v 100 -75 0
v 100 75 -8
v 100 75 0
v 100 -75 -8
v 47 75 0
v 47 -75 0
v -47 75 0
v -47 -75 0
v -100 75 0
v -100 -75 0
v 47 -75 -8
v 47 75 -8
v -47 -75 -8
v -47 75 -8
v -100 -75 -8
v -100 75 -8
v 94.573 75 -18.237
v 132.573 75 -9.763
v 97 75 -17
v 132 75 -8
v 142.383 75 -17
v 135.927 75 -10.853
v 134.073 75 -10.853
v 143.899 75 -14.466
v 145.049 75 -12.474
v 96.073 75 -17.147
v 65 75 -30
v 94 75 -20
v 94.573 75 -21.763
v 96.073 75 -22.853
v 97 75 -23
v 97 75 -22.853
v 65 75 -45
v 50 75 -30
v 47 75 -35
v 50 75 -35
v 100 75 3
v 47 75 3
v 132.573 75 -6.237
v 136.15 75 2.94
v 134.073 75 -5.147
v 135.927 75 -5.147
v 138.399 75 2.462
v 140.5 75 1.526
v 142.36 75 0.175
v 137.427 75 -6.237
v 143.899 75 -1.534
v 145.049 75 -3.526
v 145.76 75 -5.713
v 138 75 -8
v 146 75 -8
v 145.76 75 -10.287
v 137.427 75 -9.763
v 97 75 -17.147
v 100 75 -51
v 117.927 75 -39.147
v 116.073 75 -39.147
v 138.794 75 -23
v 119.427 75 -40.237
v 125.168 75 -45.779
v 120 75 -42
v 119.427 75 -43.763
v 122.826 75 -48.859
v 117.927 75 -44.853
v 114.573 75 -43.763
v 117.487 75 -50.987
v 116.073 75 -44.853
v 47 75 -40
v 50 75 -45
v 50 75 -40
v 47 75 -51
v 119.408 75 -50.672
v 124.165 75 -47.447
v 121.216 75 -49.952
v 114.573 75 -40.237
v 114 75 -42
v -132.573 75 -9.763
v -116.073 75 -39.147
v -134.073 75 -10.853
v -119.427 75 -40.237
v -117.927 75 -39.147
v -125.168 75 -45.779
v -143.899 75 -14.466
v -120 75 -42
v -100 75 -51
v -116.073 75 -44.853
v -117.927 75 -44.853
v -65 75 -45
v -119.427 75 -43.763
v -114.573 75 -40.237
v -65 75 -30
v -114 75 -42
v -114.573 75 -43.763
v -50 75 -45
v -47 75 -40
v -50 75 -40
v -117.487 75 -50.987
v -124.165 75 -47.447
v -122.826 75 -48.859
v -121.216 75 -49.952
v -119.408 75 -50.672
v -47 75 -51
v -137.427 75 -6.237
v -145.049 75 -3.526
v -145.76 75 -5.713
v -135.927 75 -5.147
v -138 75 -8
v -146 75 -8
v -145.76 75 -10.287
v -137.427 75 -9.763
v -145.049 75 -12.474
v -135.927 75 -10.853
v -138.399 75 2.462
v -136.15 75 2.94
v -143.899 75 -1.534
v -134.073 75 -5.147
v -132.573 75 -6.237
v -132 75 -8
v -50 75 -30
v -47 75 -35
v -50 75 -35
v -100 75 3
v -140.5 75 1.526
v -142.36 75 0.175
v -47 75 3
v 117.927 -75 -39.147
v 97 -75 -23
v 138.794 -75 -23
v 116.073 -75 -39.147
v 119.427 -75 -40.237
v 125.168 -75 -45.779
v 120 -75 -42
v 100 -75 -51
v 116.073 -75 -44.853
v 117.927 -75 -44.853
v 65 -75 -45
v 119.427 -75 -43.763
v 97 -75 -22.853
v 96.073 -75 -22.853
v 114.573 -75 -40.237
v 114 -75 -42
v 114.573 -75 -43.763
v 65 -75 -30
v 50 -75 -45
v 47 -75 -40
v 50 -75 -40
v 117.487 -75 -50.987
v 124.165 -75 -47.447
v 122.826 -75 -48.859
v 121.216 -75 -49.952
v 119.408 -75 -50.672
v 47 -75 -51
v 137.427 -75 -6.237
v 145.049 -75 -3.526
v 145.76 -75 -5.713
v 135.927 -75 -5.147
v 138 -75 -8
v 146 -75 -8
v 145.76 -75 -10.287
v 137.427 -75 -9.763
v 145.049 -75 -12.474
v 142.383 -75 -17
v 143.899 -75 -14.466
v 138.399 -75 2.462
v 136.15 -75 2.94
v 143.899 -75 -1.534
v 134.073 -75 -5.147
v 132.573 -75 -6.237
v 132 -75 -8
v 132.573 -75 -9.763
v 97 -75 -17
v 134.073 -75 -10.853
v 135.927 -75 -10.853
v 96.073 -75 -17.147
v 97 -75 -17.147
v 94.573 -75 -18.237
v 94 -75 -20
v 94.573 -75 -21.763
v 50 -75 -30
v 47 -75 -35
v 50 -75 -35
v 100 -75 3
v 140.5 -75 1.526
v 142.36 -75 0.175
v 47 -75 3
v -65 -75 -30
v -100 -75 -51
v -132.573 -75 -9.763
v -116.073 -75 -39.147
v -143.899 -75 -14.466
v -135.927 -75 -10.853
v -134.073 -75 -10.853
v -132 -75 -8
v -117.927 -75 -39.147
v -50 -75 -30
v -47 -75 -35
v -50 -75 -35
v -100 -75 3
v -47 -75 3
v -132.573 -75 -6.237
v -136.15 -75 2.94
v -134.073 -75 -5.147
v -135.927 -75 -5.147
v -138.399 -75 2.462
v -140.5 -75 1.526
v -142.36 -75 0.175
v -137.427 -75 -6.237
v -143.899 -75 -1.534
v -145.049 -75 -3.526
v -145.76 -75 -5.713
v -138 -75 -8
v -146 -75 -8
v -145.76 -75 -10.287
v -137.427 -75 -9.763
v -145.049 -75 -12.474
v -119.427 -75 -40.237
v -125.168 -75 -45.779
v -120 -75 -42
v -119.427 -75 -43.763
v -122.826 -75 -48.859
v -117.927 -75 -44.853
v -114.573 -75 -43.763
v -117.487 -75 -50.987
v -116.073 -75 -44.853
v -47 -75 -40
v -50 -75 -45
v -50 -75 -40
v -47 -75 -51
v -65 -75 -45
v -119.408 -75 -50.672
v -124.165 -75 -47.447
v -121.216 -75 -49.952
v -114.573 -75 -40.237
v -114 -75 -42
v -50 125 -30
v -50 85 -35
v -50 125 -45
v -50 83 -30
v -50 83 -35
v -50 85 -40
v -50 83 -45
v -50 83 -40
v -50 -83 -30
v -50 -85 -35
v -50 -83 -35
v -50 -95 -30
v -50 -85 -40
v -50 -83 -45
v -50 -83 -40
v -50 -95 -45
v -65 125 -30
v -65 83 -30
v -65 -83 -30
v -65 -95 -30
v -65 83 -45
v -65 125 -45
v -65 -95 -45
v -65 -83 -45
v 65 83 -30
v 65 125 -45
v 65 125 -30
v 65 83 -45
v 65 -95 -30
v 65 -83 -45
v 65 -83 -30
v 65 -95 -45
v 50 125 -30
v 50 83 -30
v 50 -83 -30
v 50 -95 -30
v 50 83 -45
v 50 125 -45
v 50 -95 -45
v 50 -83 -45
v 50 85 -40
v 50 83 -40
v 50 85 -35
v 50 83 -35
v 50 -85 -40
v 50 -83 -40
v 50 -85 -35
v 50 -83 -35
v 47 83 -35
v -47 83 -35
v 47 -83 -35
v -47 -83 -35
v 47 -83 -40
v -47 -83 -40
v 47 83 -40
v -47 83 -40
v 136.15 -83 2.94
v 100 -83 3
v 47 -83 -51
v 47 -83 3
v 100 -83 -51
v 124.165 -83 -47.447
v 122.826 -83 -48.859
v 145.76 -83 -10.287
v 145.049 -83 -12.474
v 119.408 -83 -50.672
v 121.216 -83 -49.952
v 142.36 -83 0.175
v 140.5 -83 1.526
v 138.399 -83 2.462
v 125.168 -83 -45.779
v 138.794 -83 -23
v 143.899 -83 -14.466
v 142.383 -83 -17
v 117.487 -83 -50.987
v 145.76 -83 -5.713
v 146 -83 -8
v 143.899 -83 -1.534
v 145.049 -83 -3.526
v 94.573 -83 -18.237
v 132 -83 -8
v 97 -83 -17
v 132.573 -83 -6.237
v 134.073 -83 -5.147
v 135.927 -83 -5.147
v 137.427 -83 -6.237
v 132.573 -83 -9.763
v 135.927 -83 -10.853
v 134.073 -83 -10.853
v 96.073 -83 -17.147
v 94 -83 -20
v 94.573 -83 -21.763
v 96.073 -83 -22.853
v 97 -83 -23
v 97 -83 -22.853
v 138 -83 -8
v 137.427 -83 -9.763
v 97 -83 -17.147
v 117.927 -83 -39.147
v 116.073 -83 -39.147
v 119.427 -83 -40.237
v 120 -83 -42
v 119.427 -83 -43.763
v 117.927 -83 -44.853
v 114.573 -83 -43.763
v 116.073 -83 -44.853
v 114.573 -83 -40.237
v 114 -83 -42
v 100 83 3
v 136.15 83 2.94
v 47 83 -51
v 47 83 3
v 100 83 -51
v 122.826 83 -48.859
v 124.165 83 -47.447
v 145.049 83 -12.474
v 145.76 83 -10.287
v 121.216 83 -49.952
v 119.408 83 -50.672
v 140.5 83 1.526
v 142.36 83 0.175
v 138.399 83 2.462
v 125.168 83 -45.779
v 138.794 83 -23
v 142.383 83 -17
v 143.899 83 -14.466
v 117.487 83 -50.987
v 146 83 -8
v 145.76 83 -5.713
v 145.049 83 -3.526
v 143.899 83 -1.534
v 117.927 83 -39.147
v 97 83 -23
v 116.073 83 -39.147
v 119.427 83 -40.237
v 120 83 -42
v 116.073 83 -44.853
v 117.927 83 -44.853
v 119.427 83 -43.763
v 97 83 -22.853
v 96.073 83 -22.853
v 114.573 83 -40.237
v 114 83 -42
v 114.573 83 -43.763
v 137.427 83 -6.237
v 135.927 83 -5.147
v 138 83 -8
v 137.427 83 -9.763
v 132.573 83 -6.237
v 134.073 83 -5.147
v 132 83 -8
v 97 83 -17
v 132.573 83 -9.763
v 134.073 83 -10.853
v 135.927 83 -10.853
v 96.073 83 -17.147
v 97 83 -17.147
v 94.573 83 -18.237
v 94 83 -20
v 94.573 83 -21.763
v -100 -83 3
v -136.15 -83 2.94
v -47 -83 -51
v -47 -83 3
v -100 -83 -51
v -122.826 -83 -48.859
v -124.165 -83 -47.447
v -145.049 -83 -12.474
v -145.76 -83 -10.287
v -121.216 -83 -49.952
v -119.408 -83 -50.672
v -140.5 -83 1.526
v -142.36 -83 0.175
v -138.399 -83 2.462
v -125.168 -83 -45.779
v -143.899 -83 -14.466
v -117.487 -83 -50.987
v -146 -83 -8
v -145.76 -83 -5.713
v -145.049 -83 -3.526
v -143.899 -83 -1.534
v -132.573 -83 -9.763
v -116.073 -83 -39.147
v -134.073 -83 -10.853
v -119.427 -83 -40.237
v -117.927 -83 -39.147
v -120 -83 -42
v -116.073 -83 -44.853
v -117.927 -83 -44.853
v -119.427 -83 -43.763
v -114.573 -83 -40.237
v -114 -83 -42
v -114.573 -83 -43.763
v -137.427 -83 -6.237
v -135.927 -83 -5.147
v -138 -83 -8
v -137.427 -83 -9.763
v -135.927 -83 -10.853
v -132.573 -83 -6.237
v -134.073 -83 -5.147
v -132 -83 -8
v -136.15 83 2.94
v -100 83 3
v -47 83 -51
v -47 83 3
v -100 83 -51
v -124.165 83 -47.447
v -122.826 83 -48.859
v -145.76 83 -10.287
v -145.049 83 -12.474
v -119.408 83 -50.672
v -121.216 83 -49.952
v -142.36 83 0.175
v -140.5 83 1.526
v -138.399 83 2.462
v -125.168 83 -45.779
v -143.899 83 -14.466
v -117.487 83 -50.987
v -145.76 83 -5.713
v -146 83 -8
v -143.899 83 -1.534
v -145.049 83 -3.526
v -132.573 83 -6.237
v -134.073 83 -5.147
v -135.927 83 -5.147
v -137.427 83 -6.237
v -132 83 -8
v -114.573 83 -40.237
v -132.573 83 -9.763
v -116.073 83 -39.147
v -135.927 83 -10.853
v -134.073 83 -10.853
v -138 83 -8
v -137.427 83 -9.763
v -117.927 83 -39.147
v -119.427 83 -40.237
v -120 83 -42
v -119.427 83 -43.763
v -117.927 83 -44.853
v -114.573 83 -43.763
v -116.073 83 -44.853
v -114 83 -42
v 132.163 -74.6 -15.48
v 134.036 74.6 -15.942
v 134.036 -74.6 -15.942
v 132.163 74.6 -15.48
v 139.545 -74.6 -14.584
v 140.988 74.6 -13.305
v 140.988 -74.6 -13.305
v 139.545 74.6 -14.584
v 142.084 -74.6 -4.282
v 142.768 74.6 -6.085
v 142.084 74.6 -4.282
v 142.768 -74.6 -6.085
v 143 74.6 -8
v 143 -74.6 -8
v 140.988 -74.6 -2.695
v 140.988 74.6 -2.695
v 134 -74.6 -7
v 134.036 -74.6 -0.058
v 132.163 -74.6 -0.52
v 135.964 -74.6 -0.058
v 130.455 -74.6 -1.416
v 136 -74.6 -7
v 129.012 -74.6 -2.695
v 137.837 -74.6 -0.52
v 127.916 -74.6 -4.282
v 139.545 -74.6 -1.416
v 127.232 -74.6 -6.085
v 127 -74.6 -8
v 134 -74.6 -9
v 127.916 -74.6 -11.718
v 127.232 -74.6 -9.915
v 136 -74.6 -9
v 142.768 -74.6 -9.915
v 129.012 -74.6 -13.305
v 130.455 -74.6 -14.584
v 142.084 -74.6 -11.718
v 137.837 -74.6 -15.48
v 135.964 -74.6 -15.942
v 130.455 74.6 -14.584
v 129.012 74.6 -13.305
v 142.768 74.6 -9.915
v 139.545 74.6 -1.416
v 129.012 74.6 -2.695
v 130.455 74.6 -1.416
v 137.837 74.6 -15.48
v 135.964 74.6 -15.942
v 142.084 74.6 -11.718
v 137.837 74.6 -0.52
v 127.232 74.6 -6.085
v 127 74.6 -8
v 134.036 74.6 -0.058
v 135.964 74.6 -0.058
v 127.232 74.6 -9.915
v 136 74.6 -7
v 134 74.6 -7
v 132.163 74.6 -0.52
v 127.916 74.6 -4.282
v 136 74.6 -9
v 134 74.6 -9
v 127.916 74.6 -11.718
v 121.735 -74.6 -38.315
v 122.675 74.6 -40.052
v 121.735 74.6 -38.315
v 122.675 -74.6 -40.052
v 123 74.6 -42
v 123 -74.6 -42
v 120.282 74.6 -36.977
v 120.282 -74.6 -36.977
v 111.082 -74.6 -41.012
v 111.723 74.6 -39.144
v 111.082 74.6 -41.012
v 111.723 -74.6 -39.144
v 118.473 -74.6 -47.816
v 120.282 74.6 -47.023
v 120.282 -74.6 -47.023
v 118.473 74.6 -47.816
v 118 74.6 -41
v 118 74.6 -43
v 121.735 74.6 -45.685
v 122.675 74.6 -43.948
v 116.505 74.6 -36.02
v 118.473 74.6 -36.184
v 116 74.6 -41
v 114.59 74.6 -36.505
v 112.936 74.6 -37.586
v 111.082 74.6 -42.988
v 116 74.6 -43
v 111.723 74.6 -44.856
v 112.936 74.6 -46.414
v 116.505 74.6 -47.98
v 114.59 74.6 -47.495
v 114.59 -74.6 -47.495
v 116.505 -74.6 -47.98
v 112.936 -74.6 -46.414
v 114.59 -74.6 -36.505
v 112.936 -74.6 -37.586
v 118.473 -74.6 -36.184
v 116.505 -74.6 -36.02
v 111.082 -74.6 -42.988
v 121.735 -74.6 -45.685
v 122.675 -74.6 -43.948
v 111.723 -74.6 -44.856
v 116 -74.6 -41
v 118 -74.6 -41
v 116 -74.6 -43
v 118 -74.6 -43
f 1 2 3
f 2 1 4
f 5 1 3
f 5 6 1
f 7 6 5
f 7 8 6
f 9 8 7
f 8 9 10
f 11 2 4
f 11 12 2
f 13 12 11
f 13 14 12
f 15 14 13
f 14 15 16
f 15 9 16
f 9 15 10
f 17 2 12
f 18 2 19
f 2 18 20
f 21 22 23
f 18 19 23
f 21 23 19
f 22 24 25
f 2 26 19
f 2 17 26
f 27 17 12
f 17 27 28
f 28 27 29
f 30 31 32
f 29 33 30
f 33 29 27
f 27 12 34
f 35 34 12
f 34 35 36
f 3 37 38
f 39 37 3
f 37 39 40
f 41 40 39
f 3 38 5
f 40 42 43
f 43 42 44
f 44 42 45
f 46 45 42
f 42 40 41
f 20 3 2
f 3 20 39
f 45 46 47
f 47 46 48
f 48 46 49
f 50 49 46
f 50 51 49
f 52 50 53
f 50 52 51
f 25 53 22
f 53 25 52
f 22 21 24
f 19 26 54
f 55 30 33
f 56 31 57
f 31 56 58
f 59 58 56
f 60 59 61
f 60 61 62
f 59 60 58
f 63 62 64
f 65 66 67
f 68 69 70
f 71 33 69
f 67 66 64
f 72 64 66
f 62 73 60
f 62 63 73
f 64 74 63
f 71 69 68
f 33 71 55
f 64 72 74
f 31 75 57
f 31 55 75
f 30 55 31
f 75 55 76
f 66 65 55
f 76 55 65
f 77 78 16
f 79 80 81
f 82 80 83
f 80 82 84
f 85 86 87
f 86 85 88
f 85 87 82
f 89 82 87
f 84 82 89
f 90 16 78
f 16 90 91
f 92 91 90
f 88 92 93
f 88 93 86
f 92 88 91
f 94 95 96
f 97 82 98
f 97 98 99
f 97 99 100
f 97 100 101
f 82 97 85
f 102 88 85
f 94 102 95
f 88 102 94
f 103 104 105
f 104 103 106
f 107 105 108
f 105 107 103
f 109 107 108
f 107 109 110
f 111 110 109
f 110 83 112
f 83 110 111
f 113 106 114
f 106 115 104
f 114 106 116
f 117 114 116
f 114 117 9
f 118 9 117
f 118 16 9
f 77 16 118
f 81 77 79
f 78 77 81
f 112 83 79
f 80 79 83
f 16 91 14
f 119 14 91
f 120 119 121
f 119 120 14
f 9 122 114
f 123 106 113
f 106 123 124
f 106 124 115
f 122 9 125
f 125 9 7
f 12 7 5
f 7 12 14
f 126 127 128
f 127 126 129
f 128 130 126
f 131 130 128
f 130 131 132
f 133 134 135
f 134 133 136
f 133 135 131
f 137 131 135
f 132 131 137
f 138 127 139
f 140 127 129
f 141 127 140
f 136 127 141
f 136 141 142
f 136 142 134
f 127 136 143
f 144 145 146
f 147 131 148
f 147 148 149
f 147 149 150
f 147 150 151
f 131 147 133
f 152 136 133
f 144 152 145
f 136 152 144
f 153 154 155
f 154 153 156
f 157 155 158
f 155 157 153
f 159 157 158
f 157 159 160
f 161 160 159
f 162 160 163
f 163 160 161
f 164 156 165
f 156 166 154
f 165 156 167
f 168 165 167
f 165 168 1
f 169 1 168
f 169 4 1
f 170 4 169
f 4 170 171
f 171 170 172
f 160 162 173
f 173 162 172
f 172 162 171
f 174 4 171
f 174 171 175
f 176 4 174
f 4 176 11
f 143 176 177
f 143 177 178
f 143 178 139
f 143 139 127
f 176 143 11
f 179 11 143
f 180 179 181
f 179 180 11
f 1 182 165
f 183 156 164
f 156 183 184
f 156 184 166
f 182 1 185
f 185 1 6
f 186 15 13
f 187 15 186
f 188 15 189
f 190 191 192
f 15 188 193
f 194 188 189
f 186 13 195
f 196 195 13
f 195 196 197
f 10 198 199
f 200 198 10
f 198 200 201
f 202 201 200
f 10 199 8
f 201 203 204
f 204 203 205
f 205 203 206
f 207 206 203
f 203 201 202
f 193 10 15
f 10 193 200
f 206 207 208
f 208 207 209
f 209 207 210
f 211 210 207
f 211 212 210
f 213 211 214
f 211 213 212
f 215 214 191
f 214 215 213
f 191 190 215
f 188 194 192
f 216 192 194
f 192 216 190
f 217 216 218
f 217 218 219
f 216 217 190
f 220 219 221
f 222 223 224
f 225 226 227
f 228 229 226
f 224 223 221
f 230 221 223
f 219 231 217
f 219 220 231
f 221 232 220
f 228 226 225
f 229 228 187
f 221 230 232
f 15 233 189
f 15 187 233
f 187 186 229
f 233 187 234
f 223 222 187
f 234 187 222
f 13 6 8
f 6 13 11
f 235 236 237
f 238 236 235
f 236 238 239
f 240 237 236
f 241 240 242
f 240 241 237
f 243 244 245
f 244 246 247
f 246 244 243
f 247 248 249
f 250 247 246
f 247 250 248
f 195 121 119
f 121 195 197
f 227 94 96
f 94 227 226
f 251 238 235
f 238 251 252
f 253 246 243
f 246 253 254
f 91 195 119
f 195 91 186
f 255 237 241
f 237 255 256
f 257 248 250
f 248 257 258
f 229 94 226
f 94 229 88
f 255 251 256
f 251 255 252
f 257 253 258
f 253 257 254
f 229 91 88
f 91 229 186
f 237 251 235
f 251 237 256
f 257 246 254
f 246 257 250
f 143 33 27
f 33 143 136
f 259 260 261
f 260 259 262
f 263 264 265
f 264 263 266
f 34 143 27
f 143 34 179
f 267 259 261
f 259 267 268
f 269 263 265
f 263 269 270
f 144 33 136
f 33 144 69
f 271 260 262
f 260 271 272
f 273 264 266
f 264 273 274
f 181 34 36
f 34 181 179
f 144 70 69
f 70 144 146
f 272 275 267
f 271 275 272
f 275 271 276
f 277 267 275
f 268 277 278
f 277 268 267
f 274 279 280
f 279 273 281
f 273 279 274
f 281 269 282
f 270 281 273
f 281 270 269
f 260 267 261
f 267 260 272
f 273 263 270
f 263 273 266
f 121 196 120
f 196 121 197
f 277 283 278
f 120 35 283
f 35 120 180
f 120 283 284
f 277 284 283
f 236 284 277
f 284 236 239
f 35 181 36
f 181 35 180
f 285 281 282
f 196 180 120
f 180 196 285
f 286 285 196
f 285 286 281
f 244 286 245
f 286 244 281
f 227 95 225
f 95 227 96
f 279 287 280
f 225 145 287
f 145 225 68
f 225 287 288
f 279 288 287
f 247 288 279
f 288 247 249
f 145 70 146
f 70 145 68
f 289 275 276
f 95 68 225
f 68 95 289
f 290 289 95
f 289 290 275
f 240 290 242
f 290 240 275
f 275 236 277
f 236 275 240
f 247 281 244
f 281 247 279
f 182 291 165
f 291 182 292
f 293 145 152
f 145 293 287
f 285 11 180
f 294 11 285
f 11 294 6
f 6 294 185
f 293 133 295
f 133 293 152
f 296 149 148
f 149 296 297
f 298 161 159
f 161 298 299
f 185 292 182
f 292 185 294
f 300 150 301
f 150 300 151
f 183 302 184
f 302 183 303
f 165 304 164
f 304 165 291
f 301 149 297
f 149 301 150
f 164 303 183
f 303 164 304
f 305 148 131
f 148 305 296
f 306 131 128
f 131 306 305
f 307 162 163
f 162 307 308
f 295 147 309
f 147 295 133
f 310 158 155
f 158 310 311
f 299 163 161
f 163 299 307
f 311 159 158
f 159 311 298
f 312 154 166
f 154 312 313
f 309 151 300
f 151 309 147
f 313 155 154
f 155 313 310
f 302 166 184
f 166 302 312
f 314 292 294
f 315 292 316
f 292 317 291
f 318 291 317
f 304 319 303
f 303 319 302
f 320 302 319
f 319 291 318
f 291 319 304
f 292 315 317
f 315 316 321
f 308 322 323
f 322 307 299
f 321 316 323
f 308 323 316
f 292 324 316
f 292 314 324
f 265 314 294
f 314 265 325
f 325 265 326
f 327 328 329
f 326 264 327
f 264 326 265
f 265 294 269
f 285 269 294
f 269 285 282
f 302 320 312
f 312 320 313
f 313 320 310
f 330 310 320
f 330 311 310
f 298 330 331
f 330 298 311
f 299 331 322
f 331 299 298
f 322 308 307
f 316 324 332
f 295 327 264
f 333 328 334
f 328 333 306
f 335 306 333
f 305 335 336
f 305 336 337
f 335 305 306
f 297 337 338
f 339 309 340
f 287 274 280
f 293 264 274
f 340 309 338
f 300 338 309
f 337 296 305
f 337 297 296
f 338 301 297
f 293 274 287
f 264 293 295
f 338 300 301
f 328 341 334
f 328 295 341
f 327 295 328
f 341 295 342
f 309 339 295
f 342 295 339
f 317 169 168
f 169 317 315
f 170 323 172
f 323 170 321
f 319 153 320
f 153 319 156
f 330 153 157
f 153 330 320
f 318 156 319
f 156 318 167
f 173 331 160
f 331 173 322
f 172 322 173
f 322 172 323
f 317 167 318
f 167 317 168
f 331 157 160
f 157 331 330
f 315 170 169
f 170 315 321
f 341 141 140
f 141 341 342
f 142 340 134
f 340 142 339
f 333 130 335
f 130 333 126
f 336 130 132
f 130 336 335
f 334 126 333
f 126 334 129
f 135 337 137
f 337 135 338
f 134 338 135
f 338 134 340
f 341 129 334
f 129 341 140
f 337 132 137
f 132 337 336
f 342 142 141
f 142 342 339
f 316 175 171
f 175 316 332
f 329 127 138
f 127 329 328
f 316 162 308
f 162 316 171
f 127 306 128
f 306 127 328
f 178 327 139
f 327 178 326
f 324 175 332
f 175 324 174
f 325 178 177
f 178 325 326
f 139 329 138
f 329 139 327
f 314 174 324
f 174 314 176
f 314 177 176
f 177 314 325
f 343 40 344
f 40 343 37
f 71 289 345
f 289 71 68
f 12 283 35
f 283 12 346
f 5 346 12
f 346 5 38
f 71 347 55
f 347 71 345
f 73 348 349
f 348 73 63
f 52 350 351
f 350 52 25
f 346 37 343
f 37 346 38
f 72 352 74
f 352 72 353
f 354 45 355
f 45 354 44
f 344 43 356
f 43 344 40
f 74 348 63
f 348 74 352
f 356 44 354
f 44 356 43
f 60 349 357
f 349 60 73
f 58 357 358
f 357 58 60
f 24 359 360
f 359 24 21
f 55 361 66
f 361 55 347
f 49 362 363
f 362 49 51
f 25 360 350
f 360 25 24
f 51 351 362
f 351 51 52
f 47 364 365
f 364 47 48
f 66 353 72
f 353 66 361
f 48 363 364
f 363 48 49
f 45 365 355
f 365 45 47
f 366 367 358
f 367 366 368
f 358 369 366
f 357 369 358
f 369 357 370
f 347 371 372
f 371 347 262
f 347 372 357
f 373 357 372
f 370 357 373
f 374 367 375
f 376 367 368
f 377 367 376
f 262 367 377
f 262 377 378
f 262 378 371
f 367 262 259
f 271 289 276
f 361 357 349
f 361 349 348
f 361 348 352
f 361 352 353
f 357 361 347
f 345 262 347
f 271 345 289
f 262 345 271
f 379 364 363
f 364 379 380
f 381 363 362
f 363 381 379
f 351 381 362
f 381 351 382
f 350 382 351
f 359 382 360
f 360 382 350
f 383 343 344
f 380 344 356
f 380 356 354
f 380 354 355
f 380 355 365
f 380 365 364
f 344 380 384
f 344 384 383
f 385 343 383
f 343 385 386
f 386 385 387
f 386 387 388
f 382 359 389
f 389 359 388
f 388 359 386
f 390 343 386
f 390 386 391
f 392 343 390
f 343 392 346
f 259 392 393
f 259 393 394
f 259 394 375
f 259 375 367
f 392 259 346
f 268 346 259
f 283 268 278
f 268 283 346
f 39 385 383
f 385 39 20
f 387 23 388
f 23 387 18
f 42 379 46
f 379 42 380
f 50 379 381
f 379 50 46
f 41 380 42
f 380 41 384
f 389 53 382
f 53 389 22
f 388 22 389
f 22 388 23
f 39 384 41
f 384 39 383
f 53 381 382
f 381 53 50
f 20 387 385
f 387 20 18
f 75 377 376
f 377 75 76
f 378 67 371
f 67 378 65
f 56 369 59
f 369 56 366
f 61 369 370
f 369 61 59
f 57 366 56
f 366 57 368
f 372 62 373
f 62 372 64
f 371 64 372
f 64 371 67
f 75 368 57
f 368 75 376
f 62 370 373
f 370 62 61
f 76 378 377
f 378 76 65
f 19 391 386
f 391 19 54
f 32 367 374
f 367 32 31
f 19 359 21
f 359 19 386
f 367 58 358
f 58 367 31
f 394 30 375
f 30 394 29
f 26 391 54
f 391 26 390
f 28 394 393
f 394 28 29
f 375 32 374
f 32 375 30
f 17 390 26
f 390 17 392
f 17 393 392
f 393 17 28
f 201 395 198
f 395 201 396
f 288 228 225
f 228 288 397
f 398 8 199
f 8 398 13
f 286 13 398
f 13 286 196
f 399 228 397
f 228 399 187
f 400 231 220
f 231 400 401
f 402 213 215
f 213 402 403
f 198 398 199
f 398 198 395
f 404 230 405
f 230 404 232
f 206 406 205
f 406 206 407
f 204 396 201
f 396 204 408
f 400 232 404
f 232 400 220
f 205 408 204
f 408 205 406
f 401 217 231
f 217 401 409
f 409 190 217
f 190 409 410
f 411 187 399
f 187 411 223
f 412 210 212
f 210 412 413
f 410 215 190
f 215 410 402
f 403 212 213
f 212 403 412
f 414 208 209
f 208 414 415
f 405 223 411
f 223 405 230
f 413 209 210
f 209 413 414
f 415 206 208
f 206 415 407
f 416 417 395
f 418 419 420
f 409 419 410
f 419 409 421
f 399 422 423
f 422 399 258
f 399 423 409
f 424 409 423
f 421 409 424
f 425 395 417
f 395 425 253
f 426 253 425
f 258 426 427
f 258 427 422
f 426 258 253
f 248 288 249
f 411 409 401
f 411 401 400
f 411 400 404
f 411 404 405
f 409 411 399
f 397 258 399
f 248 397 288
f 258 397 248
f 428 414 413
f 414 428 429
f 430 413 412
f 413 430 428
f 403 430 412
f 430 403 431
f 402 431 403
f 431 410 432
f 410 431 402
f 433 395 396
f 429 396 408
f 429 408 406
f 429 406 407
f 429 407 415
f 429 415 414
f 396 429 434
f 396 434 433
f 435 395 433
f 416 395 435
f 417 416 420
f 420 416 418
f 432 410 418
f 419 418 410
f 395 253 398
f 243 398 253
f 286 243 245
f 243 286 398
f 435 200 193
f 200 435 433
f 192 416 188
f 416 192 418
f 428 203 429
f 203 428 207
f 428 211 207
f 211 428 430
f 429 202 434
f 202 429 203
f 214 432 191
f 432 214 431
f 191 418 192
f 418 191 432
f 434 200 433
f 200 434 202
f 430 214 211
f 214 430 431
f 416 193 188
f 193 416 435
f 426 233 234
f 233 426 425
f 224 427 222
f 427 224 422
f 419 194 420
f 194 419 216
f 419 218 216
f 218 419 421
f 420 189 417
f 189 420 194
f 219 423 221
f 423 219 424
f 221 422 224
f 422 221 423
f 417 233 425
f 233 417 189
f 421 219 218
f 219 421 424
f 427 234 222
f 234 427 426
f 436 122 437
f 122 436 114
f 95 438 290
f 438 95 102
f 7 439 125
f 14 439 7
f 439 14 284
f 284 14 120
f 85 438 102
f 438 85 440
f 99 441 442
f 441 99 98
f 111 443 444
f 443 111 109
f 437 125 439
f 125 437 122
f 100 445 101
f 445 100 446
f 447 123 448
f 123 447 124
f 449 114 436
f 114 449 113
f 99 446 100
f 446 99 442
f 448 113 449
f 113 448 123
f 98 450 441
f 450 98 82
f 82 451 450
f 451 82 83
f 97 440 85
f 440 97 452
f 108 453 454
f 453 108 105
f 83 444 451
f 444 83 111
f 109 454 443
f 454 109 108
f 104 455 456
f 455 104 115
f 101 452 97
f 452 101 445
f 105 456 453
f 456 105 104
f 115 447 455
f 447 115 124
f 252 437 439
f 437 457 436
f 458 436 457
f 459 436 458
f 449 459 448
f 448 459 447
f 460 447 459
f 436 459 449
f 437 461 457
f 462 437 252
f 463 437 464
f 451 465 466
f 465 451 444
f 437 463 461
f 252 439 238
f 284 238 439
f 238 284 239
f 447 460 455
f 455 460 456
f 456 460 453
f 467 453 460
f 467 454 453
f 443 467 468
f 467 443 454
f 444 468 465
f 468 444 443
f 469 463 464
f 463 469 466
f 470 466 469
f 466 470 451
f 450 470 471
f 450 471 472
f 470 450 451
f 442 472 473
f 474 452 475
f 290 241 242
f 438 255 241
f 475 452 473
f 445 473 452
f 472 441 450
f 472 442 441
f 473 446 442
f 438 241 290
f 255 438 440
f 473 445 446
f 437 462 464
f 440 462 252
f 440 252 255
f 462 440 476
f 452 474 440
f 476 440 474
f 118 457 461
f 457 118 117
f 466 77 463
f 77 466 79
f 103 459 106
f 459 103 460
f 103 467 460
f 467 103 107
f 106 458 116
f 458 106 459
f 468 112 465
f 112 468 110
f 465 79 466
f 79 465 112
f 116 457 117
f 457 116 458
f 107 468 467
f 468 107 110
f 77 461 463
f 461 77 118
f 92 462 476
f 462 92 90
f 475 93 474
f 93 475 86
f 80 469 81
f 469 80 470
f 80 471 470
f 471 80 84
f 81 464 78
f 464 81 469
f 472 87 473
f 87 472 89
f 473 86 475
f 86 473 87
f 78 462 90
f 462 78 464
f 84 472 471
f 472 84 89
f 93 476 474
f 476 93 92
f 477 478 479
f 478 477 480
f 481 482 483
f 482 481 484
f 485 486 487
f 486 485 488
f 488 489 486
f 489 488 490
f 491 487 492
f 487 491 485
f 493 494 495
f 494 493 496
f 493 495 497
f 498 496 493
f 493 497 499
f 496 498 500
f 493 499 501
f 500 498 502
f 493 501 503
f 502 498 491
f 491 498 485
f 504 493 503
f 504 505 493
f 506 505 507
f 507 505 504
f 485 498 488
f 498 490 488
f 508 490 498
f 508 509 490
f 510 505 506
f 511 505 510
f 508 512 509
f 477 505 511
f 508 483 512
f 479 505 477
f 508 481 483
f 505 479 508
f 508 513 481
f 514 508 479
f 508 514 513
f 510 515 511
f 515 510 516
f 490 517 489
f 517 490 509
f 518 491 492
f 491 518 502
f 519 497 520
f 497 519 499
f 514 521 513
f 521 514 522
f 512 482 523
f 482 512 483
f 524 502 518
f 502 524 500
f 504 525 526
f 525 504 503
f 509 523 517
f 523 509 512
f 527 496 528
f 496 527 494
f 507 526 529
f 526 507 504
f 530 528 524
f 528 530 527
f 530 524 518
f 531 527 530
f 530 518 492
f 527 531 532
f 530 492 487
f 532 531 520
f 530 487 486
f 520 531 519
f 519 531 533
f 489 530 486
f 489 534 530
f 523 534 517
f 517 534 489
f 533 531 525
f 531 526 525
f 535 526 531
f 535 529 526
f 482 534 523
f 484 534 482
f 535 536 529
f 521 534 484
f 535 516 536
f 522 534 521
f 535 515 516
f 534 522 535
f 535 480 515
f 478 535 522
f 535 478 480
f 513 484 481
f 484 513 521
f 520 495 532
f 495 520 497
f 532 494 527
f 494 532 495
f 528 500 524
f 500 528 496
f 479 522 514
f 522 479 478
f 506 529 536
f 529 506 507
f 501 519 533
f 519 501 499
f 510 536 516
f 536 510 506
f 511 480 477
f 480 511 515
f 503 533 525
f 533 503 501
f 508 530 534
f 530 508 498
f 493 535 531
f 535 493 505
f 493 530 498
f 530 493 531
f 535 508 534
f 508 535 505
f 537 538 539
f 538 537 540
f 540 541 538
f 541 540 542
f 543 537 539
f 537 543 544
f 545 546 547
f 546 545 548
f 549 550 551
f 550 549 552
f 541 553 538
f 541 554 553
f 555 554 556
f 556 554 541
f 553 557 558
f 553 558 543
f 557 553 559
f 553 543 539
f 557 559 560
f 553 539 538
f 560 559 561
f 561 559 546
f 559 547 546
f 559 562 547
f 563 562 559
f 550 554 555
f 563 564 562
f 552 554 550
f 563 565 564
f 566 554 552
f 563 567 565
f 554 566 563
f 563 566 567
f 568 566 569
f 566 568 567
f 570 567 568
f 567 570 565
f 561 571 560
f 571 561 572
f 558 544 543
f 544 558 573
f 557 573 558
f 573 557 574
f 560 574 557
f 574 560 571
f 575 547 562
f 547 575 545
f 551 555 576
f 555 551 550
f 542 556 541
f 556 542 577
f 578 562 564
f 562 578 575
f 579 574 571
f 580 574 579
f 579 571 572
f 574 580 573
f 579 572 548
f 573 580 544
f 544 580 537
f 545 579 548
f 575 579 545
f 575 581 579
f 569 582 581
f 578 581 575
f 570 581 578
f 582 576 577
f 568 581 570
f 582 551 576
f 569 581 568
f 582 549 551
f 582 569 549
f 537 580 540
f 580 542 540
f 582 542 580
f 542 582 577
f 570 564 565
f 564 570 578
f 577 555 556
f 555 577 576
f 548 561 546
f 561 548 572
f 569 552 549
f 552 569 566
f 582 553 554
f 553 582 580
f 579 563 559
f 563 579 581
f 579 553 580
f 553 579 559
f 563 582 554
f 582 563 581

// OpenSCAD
// file: Rollers.scad
// Roller Project Part #1 Front Bracket

include <Settings.scad>;

translate(v = [10+UpperRollerRadius,0,0]){
UpperRoller();
}
translate(v = [-10-LowerRollerRadius,0,0]){
LowerRoller();
}


module UpperRoller(){
	difference(){	
		translate(v = [0,0,-d]){
			cylinder(h = RollerLength+2*d, r =  UpperRollerRadius);
		}
		translate(v = [-RollerCore/2,-RollerCore/2, - d]){
			cube(size = [RollerCore,RollerCore,RollerLength+2*d]);
		}
	}
}

module LowerRoller(){
	difference(){	
		translate(v = [0,0,-d]){
			cylinder(h = RollerLength+2*d, r =  LowerRollerRadius);
		}
		translate(v = [-RollerCore/2,-RollerCore/2, - d]){
			cube(size = [RollerCore,RollerCore,RollerLength+2*d]);
		}
	}
}
// file: Plates.scad
// Roller Project Part #1 Front Bracket

include <Settings.scad>;

FrontRightPlate();
//RearRightPlate();
//FrontLeftPlate();
//RearLeftPlate();

module FrontRightPlate(){
	RightPlate();
}

module RearRightPlate(){
	mirror([ 0, 1, 0 ]){
		RightPlate();
	}
}

module FrontLeftPlate(){
	LeftPlate();
}

module RearLeftPlate(){
	mirror([ 0, 1, 0 ]){
		LeftPlate();
	}
}

module RightPlate(){
	difference(){
		GenericPlate();
		translate(v = [50,-SlideGap/2-20,-d]){
			color("red") cube(size = [100,SlideGap,PlateThickness+2*d]);
			translate(v = [0,SlideGap/2,0]){
				cylinder(h = PlateThickness+2*d,r = SlideGap/2);
			}
		}
	}
}

module LeftPlate(){
	mirror([ 1, 0, 0 ]){
	GenericPlate();
	}
}

module GenericPlate(){
difference(){
union(){
hull(){
	translate(v = [0,-(ArmVOffset+ArmHeight+Lip+(Lip-ClipSticksize)),0]){
		color("red") cube(size = [
ClipSticksize+ArmWidth+PlateArmOverhang,
ArmHeight+ArmVOffset+2*Lip+(Lip-ClipSticksize),
PlateThickness]);
	}

	translate(v = [0,-(ArmVOffset+ArmHeight+Lip+ClipSticksize),0]){
		color("red") cube(size = [ClipSticksize+ArmWidth+PlateArmOverhang,1,PlateThickness]);
	}
	
	translate(v = [ClipSticksize+ArmWidth+PlateArmOverhang+UpperRollerProjection-UpperRollerRadius+Lip,-UpperRollerRadius,0]){
		cylinder(h= PlateThickness ,r = UpperRollerRadius+Lip); 
	}
	
	 translate(v = [
ClipSticksize+ArmWidth+PlateArmOverhang+LowerRollerProjection-LowerRollerRadius+Lip,
-(ArmVOffset+ArmHeight+ClipSticksize)+LowerRollerRadius,
0]){
		cylinder(h= PlateThickness ,r = LowerRollerRadius+Lip); 
	}

}
}

translate(v = [ClipSticksize,-ArmVOffset-ArmHeight,-d]){
	cube(size = [ArmWidth,ArmHeight,PlateThickness+2*d]);
}

translate(v = [0,-BaseVOffset-BaseHeight,-d]){
	cube(size = [ClipSticksize,BaseHeight,PlateThickness+2*d]);
}

translate(v = [ClipSticksize+ArmWidth+PlateArmOverhang+UpperRollerProjection-UpperRollerRadius+Lip,-UpperRollerRadius,-d]){
	cylinder(h= PlateThickness+2*d ,r = UpperRollerBearingCutoutRadius);
}

translate(v = [
ClipSticksize+ArmWidth+PlateArmOverhang+LowerRollerProjection-LowerRollerRadius+Lip,
-(ArmVOffset+ArmHeight+ClipSticksize)+LowerRollerRadius,
-d]){
	cylinder(h= PlateThickness+2*d ,r = LowerRollerBearingCutoutRadius);
}

}


}//end module
// file: Rig.scad
// Roller Project Part #1 Front Bracket
include <Settings.scad>;

rig();

module rig(){
//plate
translate( v= [-PlateWidth/2,-PlateDepth/2,-PlateHeight]){
	color("red") cube(size=[PlateWidth,PlateDepth,PlateHeight]);
}

//arm
translate( v= [-BaseWidth/2-ArmWidth,-PlateDepth/2-ArmForwardProjection,-ArmVOffset-ArmHeight]){
	color("DarkSlateGray") cube(size=[ArmWidth,PlateDepth+ArmForwardProjection+ArmRearProjection,ArmHeight]);
}

//arm
translate( v= [BaseWidth/2,-PlateDepth/2-ArmForwardProjection,-ArmVOffset-ArmHeight]){
	color("DarkSlateGray")  cube(size=[ArmWidth,PlateDepth+ArmForwardProjection+ArmRearProjection,ArmHeight]);
}

//base
translate( v= [-BaseWidth/2,-PlateDepth/2-BaseForwardProjection,-BaseVOffset-BaseHeight]){
	color("DarkKhakicube") cube (size=[BaseWidth,PlateDepth+BaseForwardProjection+BaseRearProjection,BaseHeight]);
}
}
// file: Settings.scad
// Mesurements Of Platform Actual & Global Settings

// Mesurements ACTUAL

PlateWidth = 200;
PlateDepth = 150;
PlateHeight = 8;

ArmWidth = 15;
ArmHeight = 15;
ArmForwardProjection = 20;
ArmRearProjection = 50;
ArmVOffset = 30;

BaseWidth = 100;
BaseHeight = 5;
BaseForwardProjection = 10;
BaseRearProjection = 10;
BaseVOffset = 35;

BaseDeflectorLength = 20;
BaseDeflectorAngle = 45;

ScrewsWidthOutset = 5;
ScrewsDepthOutset = 5;

RearPlugWidth = 10;
RearPlugHeight = 5;
RearPlugVOffset = 1;

// Options
d = 0.1;


ClipSticksize = 3;
PlateThickness = 8;

SlideGap = 6;

//lips to keep the belt in
Lip = 3;
TopLip = 500;
UpperLip = 500;
LowerLip = 500;
BottomLip = 500;


RollerCore = 2;
RollerClearance = 0.5;
RollerLength = PlateDepth - 2*RollerClearance;

UpperRollerProjection  = 40;
UpperRollerRadius = 8;

LowerRollerProjection = 20;
LowerRollerRadius = 6;

UpperRollerBearingCutoutRadius = 3;
LowerRollerBearingCutoutRadius = 3;

// Calculated


PlateArmOverhang = PlateWidth/2 - BaseWidth/2  - ArmWidth; 
// main file
// contructed view


include <Settings.scad>;


use <Rig.scad>;
use <Plates.scad>;
use <Rollers.scad>;

color("DarkSlateGray") rig();
c_FrontRightPlate();
c_RearRightPlate();
c_FrontLeftPlate();
c_RearLeftPlate();




module c_FrontRightPlate(){
	translate(v=[BaseWidth/2 -ClipSticksize ,-PlateDepth/2 ,0]){
		rotate(a = [90,0,0]){
			color("blue") FrontRightPlate();
		}
	}
}

module c_RearRightPlate(){
	translate(v=[BaseWidth/2 -ClipSticksize ,PlateDepth/2 ,0]){
		rotate(a = [-90,0,0]){
			color("blue") RearRightPlate();
		}
	}
}

module c_FrontLeftPlate(){
	translate(v=[-BaseWidth/2 +ClipSticksize ,-PlateDepth/2 ,0]){
		rotate(a = [90,0,0]){
			color("blue") FrontLeftPlate();
		}
	}
}

module c_RearLeftPlate(){
	translate(v=[-BaseWidth/2 +ClipSticksize ,PlateDepth/2 ,0]){
		rotate(a = [-90,0,0]){
			color("blue") RearLeftPlate();
		}
	}
}

translate(v = [PlateWidth/2 +UpperRollerProjection-UpperRollerRadius+Lip ,RollerLength/2,-UpperRollerRadius])
rotate(a = [90,0,0]){
	color("CornflowerBlue") UpperRoller();
}

translate(v = [
PlateWidth/2 +LowerRollerProjection-LowerRollerRadius+Lip,
RollerLength/2,
-ArmVOffset-ArmHeight-ClipSticksize+LowerRollerRadius])
rotate(a = [90,0,0]){
	color("CornflowerBlue") LowerRoller();
}
